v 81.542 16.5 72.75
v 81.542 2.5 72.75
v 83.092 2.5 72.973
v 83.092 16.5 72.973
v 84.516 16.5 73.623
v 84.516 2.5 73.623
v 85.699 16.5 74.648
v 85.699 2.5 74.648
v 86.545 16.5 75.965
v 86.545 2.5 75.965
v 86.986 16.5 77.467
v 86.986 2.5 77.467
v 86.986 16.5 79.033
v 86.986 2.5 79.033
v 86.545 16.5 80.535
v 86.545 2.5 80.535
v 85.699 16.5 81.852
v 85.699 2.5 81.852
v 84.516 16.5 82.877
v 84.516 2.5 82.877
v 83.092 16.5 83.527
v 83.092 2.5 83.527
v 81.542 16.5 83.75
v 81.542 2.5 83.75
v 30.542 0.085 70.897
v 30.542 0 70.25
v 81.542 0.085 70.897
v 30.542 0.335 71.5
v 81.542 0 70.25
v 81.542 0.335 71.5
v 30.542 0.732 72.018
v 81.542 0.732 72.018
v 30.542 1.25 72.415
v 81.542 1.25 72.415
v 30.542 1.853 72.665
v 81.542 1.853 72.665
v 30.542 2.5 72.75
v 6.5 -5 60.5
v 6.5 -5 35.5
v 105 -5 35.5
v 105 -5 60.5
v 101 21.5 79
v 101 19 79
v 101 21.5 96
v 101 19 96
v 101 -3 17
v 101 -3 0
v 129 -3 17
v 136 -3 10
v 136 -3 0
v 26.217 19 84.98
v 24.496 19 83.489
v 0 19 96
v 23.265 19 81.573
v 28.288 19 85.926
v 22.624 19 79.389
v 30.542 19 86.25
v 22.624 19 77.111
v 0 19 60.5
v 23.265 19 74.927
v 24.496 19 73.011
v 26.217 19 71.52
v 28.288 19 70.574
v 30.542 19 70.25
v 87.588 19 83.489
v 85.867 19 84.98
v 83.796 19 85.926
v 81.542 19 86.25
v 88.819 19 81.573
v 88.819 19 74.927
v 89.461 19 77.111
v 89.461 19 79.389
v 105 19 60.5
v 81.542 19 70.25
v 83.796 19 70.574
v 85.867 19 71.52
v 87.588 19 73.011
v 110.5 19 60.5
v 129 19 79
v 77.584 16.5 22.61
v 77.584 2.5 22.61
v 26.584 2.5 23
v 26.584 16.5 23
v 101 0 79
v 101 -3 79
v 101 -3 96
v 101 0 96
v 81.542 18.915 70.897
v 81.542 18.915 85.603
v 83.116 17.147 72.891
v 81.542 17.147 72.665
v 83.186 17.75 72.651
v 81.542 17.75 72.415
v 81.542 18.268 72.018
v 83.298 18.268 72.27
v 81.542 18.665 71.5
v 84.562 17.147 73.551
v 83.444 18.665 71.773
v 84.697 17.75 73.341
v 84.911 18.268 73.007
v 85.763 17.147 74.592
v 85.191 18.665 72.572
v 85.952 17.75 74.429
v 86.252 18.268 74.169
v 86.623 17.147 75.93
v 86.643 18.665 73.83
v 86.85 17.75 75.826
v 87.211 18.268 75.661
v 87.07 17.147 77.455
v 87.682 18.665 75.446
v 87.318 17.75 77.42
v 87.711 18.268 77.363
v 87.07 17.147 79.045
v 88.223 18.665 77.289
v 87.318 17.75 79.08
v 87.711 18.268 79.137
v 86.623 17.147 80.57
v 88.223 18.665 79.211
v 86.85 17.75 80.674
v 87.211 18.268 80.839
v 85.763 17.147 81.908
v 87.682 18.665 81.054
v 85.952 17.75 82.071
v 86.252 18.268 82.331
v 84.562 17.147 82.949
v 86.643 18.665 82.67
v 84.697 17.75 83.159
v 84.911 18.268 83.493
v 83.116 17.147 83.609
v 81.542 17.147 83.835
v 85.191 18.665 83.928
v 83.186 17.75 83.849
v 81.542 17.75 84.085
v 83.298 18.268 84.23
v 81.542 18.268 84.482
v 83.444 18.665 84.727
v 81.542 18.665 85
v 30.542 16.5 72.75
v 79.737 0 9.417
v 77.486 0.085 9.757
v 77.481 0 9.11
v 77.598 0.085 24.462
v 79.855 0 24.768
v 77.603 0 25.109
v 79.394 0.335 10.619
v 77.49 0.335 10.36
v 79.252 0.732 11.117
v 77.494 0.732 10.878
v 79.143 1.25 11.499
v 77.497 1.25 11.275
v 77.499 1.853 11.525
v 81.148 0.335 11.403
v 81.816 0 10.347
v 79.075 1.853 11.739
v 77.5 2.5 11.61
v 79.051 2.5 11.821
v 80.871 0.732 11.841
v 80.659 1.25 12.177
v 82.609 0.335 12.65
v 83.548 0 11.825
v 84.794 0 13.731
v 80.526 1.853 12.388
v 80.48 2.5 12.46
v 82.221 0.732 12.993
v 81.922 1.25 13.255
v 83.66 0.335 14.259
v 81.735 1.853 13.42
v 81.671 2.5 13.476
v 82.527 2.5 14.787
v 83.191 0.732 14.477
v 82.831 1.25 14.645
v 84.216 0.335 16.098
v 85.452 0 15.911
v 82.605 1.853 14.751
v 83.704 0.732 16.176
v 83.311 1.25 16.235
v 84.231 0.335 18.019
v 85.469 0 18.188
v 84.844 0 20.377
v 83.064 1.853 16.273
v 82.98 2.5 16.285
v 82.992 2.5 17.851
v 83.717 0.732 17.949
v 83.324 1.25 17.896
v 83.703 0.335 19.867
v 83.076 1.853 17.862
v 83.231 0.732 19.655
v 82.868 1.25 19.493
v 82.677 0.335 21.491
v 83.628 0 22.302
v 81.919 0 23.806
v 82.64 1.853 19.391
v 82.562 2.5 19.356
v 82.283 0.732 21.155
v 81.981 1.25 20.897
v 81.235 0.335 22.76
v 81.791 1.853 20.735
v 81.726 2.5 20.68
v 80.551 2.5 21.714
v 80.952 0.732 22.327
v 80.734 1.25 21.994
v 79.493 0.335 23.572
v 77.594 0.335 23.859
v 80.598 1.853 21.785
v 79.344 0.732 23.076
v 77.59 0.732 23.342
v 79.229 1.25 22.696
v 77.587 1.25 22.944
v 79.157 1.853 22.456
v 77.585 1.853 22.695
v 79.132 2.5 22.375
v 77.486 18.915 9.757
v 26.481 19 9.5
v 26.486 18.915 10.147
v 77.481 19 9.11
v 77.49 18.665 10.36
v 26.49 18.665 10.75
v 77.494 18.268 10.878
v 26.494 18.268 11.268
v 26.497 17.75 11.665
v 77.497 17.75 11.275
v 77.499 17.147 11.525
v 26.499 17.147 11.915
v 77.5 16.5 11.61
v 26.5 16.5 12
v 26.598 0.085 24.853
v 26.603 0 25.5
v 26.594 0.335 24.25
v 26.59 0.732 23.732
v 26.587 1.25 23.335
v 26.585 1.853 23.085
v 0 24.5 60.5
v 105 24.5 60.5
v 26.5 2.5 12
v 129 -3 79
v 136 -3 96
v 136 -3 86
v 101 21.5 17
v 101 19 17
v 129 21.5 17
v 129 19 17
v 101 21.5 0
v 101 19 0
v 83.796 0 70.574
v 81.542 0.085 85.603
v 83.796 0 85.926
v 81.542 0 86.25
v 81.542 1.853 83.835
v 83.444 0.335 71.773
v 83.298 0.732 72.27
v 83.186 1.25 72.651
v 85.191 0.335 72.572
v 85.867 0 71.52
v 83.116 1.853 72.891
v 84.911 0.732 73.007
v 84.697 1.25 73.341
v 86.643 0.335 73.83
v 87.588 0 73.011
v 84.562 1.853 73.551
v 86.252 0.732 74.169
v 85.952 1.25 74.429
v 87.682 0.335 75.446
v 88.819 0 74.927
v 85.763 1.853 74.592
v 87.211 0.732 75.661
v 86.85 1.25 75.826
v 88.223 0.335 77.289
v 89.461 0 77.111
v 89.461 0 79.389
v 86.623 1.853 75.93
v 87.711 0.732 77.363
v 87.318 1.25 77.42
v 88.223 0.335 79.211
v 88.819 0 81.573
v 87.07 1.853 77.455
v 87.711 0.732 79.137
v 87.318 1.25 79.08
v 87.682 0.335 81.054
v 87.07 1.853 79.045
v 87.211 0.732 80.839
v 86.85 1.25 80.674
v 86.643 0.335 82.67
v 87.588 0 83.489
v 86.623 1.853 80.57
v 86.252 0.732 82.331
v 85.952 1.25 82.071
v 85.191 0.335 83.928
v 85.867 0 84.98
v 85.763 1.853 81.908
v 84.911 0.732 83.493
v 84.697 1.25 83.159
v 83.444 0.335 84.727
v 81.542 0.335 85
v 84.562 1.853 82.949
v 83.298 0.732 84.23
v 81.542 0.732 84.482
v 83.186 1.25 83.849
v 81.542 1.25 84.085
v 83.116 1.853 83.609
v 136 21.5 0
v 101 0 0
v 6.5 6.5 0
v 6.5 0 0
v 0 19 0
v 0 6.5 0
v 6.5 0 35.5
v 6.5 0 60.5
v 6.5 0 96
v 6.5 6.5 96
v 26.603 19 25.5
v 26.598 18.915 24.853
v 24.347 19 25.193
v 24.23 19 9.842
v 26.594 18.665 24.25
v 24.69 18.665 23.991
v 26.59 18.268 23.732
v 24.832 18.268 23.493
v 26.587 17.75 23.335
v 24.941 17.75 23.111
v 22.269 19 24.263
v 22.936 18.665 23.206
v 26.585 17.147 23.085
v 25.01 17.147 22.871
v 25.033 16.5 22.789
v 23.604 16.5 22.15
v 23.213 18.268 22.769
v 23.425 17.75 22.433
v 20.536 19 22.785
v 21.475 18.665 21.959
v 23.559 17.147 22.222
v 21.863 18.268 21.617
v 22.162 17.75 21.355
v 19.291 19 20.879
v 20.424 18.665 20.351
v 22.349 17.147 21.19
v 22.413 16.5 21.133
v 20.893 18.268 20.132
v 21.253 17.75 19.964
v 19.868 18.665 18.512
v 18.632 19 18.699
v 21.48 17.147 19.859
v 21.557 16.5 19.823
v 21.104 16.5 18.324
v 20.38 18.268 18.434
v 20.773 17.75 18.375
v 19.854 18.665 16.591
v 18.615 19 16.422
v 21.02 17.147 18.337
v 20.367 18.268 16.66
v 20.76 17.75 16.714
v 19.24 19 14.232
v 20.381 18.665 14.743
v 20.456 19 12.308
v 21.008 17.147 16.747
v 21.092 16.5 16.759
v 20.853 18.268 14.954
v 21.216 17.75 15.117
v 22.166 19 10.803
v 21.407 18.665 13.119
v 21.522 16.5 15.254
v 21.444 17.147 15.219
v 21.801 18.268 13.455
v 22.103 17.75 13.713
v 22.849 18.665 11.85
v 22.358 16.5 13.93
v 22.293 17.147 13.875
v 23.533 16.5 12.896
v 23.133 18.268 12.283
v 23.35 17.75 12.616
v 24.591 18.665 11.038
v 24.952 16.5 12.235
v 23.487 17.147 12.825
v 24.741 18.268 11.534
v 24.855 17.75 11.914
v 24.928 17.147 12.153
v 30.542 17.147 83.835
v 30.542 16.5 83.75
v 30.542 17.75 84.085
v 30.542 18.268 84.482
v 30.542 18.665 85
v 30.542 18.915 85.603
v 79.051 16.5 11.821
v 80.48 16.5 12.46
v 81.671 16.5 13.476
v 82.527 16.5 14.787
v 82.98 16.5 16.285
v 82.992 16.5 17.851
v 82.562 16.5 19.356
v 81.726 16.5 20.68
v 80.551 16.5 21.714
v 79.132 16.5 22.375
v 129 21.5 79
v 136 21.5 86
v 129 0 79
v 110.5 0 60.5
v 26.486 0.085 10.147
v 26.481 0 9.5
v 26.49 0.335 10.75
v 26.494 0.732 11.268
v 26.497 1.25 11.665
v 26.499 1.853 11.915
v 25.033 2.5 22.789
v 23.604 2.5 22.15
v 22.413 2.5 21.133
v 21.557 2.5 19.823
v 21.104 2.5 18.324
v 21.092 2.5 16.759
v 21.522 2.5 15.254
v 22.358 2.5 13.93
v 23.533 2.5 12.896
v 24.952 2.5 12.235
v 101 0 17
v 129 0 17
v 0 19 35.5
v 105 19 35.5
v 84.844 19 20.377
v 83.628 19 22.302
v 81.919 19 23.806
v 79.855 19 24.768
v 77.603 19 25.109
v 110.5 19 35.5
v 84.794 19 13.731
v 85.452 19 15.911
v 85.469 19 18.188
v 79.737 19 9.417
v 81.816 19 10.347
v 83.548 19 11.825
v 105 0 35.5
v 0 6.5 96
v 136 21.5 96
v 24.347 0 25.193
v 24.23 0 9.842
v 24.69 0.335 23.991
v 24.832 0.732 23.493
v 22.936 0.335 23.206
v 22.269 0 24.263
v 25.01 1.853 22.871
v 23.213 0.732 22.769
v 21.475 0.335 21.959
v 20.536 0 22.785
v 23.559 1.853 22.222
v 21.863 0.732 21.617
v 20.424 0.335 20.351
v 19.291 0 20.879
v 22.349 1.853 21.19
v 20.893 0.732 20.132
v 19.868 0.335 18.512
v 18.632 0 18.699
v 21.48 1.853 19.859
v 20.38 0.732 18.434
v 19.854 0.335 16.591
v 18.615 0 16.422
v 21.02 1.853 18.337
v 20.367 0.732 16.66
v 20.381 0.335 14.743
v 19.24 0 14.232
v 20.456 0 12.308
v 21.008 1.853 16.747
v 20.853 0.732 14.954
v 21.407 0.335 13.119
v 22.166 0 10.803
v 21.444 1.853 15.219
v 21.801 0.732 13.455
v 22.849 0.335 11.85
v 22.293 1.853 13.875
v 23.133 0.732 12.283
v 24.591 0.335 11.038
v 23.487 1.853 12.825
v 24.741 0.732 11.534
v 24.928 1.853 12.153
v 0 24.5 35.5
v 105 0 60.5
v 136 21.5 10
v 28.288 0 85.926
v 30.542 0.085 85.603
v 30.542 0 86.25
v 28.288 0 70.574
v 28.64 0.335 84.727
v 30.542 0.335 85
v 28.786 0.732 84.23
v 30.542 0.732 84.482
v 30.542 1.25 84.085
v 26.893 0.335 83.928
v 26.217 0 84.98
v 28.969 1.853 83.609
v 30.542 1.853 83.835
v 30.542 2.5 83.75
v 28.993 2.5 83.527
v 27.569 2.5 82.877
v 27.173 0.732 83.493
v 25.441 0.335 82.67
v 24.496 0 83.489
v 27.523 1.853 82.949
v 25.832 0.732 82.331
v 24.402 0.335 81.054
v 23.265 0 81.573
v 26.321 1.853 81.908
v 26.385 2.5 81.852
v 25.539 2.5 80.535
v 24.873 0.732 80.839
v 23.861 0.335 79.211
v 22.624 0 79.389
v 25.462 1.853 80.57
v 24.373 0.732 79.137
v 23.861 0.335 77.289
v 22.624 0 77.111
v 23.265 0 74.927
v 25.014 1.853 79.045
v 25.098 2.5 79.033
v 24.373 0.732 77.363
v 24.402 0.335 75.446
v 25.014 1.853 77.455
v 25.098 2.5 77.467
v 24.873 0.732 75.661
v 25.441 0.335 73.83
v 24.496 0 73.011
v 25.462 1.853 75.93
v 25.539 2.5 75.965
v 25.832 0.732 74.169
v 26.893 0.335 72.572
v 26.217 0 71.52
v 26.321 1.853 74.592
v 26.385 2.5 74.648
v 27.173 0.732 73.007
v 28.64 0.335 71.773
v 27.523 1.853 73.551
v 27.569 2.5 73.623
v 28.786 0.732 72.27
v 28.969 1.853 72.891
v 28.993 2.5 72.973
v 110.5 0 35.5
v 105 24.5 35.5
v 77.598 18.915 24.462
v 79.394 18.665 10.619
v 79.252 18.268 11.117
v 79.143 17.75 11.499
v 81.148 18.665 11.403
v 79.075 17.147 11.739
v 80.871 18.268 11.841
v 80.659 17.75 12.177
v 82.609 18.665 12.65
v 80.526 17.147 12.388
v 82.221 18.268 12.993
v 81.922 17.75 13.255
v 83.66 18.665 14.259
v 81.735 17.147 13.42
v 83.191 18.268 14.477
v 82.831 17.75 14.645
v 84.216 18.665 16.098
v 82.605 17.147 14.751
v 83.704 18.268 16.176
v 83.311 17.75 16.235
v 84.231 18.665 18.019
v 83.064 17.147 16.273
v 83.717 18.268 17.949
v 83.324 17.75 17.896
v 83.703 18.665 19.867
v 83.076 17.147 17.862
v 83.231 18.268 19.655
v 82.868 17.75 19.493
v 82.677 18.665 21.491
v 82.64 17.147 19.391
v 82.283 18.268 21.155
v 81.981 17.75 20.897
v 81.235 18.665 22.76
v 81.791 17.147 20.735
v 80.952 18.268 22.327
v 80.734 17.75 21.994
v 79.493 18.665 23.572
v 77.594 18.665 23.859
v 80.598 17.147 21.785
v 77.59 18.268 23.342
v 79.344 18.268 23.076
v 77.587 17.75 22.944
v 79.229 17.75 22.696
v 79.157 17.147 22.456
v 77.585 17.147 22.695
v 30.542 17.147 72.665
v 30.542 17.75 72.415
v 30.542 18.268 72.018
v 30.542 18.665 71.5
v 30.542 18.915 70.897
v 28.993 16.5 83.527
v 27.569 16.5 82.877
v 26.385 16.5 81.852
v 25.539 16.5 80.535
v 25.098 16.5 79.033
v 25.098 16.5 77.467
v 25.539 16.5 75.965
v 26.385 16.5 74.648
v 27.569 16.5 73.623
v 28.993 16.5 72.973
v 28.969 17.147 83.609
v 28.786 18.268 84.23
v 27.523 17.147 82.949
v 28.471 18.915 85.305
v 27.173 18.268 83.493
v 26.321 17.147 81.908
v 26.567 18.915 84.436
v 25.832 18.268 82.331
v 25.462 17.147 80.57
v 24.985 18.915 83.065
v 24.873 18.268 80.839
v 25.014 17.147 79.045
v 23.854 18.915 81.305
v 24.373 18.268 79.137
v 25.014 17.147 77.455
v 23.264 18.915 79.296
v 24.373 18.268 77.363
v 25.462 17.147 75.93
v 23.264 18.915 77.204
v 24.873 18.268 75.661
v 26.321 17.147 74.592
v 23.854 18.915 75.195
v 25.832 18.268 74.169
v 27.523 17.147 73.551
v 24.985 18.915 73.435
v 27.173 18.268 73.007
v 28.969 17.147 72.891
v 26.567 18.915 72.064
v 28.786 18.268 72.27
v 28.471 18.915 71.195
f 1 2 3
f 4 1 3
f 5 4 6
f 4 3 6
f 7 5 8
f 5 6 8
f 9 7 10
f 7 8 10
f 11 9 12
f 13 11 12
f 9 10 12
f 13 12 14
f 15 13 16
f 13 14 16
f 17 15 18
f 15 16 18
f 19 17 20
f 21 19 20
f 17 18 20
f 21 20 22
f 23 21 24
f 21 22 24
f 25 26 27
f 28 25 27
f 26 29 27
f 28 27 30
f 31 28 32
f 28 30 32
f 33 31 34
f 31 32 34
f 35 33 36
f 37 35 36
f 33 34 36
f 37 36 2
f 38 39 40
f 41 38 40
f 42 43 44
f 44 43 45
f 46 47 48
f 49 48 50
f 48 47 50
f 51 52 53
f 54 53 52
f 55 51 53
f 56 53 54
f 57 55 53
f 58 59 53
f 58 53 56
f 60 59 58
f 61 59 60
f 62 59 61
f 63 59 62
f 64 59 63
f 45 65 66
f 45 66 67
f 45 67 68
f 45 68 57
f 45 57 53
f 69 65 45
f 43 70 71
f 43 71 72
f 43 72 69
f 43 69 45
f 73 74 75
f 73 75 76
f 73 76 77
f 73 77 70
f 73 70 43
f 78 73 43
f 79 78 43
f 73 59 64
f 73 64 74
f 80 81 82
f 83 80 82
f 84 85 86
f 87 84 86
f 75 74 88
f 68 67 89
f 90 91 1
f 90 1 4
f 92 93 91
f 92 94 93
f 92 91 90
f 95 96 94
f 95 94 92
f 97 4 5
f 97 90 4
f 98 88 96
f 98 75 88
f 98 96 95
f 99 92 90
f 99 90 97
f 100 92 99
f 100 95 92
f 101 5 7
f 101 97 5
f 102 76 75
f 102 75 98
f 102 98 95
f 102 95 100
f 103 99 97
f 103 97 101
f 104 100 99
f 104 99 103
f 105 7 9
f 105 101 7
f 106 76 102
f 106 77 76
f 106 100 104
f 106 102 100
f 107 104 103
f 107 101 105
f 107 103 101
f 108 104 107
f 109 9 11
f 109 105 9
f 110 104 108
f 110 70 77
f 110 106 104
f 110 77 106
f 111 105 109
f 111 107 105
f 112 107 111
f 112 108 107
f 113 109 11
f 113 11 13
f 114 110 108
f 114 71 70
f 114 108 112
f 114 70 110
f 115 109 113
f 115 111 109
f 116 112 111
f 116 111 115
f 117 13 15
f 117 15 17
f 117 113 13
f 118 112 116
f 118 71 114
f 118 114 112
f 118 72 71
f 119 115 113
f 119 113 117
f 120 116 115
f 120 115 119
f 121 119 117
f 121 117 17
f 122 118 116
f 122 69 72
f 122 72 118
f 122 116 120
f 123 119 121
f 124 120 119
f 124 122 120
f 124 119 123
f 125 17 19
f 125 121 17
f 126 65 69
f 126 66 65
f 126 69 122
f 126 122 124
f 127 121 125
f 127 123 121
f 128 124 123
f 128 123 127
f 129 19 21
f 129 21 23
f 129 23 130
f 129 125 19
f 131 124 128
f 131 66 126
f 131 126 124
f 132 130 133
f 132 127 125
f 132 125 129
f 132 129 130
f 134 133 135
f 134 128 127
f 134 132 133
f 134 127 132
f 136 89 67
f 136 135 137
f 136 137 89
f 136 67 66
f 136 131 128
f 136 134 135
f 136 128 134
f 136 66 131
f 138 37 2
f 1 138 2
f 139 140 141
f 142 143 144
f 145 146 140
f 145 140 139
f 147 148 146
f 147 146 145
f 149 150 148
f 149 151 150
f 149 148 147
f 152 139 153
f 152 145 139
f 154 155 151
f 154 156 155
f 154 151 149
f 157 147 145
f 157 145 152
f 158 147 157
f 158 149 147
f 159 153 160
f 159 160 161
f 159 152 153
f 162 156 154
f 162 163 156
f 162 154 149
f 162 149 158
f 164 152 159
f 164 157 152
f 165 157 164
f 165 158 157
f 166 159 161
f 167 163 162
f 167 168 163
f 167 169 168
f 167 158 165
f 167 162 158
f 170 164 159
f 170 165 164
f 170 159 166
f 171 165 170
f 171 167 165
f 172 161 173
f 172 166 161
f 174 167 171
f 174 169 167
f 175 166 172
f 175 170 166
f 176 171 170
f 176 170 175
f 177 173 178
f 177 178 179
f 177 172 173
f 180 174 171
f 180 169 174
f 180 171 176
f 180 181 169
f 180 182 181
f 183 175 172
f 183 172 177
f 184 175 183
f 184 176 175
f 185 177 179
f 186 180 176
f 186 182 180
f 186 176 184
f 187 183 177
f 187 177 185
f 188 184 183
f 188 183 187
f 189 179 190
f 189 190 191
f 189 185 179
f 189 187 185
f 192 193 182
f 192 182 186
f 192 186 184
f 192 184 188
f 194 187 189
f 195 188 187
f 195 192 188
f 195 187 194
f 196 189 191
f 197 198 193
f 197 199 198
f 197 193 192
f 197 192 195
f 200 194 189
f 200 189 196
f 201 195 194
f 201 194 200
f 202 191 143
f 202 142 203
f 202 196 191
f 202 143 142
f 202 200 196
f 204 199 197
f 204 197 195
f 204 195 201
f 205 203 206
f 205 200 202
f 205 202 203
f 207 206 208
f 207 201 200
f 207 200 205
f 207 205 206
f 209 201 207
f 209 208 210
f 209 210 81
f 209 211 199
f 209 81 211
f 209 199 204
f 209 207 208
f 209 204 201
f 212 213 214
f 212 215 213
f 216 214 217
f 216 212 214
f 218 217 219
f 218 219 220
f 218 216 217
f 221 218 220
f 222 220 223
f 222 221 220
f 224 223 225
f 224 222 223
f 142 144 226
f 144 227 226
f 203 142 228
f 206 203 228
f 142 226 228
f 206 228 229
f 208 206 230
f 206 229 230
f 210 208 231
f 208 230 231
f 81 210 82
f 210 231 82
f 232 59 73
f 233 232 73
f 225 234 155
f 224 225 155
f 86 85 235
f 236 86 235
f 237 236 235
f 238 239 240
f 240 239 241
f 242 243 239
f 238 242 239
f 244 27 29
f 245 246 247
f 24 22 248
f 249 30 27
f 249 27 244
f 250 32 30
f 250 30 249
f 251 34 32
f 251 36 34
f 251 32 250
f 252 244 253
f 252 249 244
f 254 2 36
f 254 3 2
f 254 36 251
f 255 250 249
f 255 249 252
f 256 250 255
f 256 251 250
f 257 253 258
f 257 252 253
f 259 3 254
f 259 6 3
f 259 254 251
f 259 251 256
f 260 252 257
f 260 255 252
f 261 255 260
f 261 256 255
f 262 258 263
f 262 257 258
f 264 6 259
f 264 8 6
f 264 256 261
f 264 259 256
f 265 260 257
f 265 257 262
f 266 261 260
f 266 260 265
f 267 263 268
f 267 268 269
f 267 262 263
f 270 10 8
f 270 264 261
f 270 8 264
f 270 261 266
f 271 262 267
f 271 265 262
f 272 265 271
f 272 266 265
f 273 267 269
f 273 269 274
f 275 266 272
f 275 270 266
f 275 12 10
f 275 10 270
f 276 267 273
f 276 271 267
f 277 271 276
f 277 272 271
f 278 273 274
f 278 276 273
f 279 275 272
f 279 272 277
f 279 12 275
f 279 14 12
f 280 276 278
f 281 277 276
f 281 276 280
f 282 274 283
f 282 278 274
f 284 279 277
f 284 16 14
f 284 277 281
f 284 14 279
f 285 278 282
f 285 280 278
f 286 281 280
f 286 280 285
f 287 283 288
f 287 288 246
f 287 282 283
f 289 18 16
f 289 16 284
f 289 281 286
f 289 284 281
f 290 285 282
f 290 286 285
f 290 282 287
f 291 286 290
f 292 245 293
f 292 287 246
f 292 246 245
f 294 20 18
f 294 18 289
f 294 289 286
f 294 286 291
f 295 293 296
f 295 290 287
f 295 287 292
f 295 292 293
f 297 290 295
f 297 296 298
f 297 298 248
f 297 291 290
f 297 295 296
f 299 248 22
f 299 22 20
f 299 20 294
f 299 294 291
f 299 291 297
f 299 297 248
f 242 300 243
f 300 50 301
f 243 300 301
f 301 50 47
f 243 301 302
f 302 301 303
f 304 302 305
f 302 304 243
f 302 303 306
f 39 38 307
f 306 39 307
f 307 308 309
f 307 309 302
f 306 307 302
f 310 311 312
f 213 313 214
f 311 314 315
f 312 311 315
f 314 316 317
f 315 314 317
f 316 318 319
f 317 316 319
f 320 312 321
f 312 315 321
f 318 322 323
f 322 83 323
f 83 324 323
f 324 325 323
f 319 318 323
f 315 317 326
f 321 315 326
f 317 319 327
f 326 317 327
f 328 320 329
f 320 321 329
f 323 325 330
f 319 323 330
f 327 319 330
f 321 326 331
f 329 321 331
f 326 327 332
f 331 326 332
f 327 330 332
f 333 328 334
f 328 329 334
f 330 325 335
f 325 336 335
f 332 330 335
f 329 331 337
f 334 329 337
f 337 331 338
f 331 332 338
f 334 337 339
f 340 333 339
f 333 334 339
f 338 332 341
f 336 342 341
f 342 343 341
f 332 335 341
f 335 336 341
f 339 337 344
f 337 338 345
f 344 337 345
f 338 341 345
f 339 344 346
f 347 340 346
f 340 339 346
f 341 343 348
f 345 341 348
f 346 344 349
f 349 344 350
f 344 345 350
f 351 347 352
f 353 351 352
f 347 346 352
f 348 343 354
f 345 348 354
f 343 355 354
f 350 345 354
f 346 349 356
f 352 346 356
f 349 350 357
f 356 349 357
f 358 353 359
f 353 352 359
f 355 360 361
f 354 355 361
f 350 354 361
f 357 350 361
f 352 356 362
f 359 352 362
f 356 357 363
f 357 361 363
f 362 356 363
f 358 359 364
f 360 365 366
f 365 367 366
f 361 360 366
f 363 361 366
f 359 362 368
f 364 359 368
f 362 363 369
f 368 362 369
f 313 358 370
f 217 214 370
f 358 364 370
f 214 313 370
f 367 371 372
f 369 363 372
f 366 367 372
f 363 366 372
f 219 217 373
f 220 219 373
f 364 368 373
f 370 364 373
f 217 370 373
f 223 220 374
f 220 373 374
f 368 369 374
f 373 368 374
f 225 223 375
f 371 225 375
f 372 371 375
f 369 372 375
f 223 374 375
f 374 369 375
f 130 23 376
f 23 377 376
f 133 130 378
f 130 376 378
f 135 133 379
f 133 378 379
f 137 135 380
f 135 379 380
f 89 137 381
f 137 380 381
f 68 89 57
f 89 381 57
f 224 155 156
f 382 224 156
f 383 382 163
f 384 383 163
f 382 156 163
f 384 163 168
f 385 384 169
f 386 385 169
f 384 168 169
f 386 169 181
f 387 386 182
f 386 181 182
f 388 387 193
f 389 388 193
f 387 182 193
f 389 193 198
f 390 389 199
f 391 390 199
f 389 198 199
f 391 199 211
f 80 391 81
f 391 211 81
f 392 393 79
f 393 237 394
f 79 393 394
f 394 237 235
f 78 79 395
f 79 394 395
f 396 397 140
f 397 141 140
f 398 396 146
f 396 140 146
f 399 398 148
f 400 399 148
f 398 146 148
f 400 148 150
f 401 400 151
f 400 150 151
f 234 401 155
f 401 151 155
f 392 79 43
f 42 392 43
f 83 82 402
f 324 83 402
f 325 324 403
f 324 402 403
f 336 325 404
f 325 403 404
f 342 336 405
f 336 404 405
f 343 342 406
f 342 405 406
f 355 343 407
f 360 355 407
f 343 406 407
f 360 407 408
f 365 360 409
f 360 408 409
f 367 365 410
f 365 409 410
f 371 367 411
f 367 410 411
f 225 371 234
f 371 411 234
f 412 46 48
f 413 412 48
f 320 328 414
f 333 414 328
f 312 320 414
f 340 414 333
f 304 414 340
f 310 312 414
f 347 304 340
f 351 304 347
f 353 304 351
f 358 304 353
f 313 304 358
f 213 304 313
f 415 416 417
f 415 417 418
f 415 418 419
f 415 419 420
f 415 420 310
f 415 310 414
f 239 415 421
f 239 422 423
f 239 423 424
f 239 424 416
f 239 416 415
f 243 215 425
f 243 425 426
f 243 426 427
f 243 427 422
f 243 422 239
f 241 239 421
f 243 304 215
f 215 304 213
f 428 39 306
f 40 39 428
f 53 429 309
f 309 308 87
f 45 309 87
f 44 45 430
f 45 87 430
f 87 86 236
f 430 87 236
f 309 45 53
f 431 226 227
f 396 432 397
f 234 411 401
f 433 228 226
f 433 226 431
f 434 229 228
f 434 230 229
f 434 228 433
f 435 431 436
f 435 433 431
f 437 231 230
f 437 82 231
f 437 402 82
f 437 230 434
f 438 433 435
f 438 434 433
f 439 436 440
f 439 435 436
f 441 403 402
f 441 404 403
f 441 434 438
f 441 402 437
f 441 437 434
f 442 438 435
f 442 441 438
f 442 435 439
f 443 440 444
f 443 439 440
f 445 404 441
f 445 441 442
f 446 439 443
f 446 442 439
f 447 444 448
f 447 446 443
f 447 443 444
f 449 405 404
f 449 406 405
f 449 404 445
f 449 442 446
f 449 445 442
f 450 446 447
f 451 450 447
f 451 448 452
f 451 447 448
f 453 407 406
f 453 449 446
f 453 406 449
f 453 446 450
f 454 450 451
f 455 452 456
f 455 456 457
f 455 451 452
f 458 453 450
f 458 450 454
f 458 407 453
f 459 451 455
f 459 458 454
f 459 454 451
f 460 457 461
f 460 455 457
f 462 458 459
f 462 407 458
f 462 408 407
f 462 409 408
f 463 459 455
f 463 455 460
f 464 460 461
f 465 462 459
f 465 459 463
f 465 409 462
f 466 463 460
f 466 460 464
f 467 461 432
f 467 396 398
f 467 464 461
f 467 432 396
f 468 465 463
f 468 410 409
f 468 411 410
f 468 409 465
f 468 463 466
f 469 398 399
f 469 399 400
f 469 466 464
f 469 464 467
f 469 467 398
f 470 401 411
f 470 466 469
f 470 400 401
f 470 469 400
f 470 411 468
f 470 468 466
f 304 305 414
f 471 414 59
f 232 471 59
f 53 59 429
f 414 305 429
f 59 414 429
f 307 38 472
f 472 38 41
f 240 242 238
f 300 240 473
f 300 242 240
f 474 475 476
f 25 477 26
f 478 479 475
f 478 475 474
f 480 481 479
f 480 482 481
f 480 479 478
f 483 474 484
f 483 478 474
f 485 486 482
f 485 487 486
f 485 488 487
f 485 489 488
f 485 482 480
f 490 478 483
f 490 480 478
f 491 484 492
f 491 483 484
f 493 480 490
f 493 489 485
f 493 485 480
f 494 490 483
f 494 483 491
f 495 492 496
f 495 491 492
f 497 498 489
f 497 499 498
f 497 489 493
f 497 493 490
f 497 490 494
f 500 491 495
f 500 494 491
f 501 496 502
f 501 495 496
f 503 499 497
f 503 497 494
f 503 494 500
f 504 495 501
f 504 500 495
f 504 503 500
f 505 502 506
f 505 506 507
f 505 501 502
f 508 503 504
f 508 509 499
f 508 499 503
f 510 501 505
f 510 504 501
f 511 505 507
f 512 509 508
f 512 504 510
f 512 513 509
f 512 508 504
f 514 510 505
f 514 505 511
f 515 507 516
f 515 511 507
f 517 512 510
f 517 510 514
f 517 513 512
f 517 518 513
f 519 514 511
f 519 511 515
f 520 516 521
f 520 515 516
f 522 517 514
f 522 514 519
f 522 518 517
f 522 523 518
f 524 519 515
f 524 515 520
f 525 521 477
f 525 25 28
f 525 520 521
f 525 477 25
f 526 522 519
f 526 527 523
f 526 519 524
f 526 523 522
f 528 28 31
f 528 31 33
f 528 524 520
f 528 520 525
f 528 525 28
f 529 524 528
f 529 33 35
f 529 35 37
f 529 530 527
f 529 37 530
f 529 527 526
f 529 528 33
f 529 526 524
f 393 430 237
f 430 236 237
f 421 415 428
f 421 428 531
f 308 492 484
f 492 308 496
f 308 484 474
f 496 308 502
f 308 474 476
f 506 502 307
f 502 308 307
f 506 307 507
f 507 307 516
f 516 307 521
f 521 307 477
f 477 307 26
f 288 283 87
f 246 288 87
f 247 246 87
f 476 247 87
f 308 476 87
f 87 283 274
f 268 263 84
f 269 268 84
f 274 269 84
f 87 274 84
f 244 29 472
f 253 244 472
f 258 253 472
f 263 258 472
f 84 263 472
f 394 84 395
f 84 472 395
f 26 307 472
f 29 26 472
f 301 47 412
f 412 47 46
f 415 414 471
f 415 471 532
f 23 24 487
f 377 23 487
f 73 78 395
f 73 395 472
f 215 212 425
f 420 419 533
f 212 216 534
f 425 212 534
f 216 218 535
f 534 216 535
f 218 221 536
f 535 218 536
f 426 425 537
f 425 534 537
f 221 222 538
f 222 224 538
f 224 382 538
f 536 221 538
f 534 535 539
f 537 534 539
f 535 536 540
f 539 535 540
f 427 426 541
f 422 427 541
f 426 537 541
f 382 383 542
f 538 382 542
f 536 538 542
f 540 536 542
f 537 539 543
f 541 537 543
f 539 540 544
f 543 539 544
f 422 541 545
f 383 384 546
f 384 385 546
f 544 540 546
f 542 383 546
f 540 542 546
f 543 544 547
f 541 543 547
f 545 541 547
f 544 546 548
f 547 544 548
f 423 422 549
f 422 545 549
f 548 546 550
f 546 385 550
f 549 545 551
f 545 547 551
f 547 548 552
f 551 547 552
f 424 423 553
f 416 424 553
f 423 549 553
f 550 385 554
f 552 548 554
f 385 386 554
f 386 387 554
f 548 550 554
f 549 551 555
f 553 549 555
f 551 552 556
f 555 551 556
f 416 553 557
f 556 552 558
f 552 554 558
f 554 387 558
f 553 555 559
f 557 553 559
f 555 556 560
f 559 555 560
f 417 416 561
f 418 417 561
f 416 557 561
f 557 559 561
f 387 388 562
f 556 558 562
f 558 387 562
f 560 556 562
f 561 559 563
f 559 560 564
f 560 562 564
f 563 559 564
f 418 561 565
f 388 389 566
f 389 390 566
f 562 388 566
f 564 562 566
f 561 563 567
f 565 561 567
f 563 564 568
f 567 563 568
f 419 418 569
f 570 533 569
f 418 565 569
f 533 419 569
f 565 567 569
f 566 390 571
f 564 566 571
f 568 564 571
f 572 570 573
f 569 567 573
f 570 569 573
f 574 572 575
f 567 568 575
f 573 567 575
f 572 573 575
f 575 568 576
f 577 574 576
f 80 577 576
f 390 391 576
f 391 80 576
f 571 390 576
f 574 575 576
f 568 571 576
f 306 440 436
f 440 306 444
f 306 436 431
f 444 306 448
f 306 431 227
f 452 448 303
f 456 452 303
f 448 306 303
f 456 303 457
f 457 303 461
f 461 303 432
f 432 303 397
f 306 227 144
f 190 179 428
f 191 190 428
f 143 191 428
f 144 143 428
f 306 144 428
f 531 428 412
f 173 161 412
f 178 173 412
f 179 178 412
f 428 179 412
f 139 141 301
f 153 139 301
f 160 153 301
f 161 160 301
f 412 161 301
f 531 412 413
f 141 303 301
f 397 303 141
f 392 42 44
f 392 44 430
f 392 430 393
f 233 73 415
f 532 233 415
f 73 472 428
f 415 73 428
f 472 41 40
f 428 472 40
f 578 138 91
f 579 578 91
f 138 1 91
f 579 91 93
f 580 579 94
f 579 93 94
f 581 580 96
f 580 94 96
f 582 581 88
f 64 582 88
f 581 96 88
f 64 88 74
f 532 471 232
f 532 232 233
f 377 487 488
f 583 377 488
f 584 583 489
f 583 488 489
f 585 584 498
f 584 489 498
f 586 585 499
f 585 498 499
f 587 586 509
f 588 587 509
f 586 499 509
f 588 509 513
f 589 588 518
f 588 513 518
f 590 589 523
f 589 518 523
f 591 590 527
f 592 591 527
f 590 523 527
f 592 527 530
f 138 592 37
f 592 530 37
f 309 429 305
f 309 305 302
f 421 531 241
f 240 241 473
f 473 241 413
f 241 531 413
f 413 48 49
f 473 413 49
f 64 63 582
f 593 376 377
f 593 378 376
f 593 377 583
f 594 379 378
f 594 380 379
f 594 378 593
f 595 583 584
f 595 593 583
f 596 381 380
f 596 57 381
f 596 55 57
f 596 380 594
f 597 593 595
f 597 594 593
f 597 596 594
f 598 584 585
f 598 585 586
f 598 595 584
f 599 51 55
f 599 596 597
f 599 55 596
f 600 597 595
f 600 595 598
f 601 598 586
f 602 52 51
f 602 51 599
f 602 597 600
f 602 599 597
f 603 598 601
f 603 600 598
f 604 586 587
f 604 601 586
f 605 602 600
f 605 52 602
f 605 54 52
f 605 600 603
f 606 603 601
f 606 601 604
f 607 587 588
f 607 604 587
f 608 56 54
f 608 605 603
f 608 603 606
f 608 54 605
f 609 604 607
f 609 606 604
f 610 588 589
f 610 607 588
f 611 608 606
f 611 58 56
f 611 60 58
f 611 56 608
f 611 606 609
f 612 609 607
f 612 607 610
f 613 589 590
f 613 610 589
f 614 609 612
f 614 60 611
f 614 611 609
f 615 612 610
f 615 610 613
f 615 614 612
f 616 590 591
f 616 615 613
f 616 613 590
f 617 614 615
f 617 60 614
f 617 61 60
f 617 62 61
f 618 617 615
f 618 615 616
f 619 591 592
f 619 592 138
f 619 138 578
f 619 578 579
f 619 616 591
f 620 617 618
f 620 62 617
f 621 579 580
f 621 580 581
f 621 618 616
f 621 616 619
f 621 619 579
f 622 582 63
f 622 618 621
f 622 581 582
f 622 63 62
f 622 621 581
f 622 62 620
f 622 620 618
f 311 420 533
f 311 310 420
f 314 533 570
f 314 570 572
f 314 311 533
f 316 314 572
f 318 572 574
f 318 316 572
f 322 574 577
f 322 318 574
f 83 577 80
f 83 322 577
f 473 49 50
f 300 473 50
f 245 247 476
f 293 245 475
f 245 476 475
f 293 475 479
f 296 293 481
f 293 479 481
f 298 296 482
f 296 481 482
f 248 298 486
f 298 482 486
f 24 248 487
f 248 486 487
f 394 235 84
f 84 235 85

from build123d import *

# Parameters (mm, degrees)
SKETCH1_W                = 105
SKETCH1_H                = 25
BOSS_EXTRUDE4_DEPTH      = 19
BOSS_EXTRUDE5_DEPTH      = 5.5
BOSS_EXTRUDE5_DEPTH_BACK = 24
SKETCH4_W                = 105
SKETCH4_H                = 12.5
FILLET3_R                = 2.5
BOSS_EXTRUDE7_DEPTH      = 2.5
BOSS_EXTRUDE7_DEPTH_BACK = 22
SKETCH7_W                = 6.5
SKETCH7_H                = 11.5
CUT_EXTRUDE1_DEPTH       = 96


with BuildPart() as part:
    # Sketch1 → Boss-Extrude4 (new body)
    # profile 1 of 5: a face of its own
    with BuildSketch(Plane(origin=(0, 0, 0), x_dir=(1, 0, 0), z_dir=(0, 1, 0))):
        Polygon((136, 0), (94, 0), (94, -17), (129, -17), (136, -10), align=None)
    # profile 2 of 5: a face of its own
    with BuildSketch(Plane(origin=(0, 0, 0), x_dir=(1, 0, 0), z_dir=(0, 1, 0))):
        Polygon((94, 0), (0, 0), (0, -35.5), (105, -35.5), (110.5, -35.5), (129, -17), (94, -17), align=None)
        with BuildLine():
            ThreePointArc((26.584181208, -22.999838941), (21.042251663, -17.542090604), (26.5, -12.000161059))
            Line((26.5, -12.000161059), (77.5, -11.609854936))
            ThreePointArc((77.5, -11.609854936), (83.041929546, -17.067603273), (77.584181208, -22.609532819))
            Line((77.584181208, -22.609532819), (26.584181208, -22.999838941))
        make_face(mode=Mode.SUBTRACT)
    # profile 3 of 5: a face of its own
    with BuildSketch(Plane(origin=(0, 0, 0), x_dir=(1, 0, 0), z_dir=(0, 1, 0))):
        with Locations((52.5, -48)):
            Rectangle(SKETCH1_W, SKETCH1_H)
    # profile 4 of 5: a face of its own
    with BuildSketch(Plane(origin=(0, 0, 0), x_dir=(1, 0, 0), z_dir=(0, 1, 0))):
        Polygon((105, -60.5), (0, -60.5), (0, -96), (94, -96), (94, -79), (129, -79), (110.5, -60.5), align=None)
        with BuildLine():
            ThreePointArc((30.542090604, -83.75), (25.042090604, -78.25), (30.542090604, -72.75))
            Line((30.542090604, -72.75), (81.542090604, -72.75))
            ThreePointArc((81.542090604, -72.75), (87.042090604, -78.25), (81.542090604, -83.75))
            Line((81.542090604, -83.75), (30.542090604, -83.75))
        make_face(mode=Mode.SUBTRACT)
    # profile 5 of 5: a face of its own
    with BuildSketch(Plane(origin=(0, 0, 0), x_dir=(1, 0, 0), z_dir=(0, 1, 0))):
        Polygon((94, -79), (94, -96), (136, -96), (136, -86), (129, -79), align=None)
    extrude(amount=BOSS_EXTRUDE4_DEPTH)

    # Sketch4 → Boss-Extrude5 (add, two sides: drawn at the far end of the back side and taken through both)
    with BuildSketch(Plane(origin=(0, 19, 0), x_dir=(1, 0, 0), z_dir=(0, 1, 0)).offset(-BOSS_EXTRUDE5_DEPTH_BACK)):
        with Locations((52.5, -41.75)):
            Rectangle(SKETCH4_W, SKETCH4_H)
        with Locations((52.5, -54.25)):
            Rectangle(SKETCH4_W, SKETCH4_H)
    extrude(amount=BOSS_EXTRUDE5_DEPTH + BOSS_EXTRUDE5_DEPTH_BACK)

    # Fillet3
    fillet3_edges = [part.edges().sort_by_distance(p)[0] for p in [
        (56.042090604, 19, 72.75),
        (56.042090604, 0, 72.75),
        (25.042090604, 0, 78.25),
        (56.042090604, 0, 83.75),
        (87.042090604, 0, 78.25),
        (52, 0, 11.805007997),
        (21.042251663, 0, 17.542090604),
        (52.084181208, 0, 22.80468588),
        (83.041929546, 0, 17.067603273),
        (83.041929546, 19, 17.067603273),
        (52.084181208, 19, 22.80468588),
        (21.042251663, 19, 17.542090604),
        (52, 19, 11.805007997),
        (87.042090604, 19, 78.25),
        (56.042090604, 19, 83.75),
        (25.042090604, 19, 78.25),
    ]]
    fillet(fillet3_edges, radius=FILLET3_R)

    # Sketch5 → Boss-Extrude7 (add, two sides: drawn at the far end of the back side and taken through both)
    with BuildSketch(Plane(origin=(0, 19, 0), x_dir=(1, 0, 0), z_dir=(0, 1, 0)).offset(-BOSS_EXTRUDE7_DEPTH_BACK)):
        Polygon((101, 0), (101, -17), (129, -17), (136, -10), (136, 0), align=None)
        Polygon((136, -86), (129, -79), (101, -79), (101, -96), (136, -96), align=None)
    extrude(amount=BOSS_EXTRUDE7_DEPTH + BOSS_EXTRUDE7_DEPTH_BACK)

    # Sketch7 → Cut-Extrude1 (cut)
    with BuildSketch(Plane.XY.offset(96)):
        with Locations((3.25, 0.75)):
            Rectangle(SKETCH7_W, SKETCH7_H)
    extrude(amount=-CUT_EXTRUDE1_DEPTH, mode=Mode.SUBTRACT)


solid = part.part
